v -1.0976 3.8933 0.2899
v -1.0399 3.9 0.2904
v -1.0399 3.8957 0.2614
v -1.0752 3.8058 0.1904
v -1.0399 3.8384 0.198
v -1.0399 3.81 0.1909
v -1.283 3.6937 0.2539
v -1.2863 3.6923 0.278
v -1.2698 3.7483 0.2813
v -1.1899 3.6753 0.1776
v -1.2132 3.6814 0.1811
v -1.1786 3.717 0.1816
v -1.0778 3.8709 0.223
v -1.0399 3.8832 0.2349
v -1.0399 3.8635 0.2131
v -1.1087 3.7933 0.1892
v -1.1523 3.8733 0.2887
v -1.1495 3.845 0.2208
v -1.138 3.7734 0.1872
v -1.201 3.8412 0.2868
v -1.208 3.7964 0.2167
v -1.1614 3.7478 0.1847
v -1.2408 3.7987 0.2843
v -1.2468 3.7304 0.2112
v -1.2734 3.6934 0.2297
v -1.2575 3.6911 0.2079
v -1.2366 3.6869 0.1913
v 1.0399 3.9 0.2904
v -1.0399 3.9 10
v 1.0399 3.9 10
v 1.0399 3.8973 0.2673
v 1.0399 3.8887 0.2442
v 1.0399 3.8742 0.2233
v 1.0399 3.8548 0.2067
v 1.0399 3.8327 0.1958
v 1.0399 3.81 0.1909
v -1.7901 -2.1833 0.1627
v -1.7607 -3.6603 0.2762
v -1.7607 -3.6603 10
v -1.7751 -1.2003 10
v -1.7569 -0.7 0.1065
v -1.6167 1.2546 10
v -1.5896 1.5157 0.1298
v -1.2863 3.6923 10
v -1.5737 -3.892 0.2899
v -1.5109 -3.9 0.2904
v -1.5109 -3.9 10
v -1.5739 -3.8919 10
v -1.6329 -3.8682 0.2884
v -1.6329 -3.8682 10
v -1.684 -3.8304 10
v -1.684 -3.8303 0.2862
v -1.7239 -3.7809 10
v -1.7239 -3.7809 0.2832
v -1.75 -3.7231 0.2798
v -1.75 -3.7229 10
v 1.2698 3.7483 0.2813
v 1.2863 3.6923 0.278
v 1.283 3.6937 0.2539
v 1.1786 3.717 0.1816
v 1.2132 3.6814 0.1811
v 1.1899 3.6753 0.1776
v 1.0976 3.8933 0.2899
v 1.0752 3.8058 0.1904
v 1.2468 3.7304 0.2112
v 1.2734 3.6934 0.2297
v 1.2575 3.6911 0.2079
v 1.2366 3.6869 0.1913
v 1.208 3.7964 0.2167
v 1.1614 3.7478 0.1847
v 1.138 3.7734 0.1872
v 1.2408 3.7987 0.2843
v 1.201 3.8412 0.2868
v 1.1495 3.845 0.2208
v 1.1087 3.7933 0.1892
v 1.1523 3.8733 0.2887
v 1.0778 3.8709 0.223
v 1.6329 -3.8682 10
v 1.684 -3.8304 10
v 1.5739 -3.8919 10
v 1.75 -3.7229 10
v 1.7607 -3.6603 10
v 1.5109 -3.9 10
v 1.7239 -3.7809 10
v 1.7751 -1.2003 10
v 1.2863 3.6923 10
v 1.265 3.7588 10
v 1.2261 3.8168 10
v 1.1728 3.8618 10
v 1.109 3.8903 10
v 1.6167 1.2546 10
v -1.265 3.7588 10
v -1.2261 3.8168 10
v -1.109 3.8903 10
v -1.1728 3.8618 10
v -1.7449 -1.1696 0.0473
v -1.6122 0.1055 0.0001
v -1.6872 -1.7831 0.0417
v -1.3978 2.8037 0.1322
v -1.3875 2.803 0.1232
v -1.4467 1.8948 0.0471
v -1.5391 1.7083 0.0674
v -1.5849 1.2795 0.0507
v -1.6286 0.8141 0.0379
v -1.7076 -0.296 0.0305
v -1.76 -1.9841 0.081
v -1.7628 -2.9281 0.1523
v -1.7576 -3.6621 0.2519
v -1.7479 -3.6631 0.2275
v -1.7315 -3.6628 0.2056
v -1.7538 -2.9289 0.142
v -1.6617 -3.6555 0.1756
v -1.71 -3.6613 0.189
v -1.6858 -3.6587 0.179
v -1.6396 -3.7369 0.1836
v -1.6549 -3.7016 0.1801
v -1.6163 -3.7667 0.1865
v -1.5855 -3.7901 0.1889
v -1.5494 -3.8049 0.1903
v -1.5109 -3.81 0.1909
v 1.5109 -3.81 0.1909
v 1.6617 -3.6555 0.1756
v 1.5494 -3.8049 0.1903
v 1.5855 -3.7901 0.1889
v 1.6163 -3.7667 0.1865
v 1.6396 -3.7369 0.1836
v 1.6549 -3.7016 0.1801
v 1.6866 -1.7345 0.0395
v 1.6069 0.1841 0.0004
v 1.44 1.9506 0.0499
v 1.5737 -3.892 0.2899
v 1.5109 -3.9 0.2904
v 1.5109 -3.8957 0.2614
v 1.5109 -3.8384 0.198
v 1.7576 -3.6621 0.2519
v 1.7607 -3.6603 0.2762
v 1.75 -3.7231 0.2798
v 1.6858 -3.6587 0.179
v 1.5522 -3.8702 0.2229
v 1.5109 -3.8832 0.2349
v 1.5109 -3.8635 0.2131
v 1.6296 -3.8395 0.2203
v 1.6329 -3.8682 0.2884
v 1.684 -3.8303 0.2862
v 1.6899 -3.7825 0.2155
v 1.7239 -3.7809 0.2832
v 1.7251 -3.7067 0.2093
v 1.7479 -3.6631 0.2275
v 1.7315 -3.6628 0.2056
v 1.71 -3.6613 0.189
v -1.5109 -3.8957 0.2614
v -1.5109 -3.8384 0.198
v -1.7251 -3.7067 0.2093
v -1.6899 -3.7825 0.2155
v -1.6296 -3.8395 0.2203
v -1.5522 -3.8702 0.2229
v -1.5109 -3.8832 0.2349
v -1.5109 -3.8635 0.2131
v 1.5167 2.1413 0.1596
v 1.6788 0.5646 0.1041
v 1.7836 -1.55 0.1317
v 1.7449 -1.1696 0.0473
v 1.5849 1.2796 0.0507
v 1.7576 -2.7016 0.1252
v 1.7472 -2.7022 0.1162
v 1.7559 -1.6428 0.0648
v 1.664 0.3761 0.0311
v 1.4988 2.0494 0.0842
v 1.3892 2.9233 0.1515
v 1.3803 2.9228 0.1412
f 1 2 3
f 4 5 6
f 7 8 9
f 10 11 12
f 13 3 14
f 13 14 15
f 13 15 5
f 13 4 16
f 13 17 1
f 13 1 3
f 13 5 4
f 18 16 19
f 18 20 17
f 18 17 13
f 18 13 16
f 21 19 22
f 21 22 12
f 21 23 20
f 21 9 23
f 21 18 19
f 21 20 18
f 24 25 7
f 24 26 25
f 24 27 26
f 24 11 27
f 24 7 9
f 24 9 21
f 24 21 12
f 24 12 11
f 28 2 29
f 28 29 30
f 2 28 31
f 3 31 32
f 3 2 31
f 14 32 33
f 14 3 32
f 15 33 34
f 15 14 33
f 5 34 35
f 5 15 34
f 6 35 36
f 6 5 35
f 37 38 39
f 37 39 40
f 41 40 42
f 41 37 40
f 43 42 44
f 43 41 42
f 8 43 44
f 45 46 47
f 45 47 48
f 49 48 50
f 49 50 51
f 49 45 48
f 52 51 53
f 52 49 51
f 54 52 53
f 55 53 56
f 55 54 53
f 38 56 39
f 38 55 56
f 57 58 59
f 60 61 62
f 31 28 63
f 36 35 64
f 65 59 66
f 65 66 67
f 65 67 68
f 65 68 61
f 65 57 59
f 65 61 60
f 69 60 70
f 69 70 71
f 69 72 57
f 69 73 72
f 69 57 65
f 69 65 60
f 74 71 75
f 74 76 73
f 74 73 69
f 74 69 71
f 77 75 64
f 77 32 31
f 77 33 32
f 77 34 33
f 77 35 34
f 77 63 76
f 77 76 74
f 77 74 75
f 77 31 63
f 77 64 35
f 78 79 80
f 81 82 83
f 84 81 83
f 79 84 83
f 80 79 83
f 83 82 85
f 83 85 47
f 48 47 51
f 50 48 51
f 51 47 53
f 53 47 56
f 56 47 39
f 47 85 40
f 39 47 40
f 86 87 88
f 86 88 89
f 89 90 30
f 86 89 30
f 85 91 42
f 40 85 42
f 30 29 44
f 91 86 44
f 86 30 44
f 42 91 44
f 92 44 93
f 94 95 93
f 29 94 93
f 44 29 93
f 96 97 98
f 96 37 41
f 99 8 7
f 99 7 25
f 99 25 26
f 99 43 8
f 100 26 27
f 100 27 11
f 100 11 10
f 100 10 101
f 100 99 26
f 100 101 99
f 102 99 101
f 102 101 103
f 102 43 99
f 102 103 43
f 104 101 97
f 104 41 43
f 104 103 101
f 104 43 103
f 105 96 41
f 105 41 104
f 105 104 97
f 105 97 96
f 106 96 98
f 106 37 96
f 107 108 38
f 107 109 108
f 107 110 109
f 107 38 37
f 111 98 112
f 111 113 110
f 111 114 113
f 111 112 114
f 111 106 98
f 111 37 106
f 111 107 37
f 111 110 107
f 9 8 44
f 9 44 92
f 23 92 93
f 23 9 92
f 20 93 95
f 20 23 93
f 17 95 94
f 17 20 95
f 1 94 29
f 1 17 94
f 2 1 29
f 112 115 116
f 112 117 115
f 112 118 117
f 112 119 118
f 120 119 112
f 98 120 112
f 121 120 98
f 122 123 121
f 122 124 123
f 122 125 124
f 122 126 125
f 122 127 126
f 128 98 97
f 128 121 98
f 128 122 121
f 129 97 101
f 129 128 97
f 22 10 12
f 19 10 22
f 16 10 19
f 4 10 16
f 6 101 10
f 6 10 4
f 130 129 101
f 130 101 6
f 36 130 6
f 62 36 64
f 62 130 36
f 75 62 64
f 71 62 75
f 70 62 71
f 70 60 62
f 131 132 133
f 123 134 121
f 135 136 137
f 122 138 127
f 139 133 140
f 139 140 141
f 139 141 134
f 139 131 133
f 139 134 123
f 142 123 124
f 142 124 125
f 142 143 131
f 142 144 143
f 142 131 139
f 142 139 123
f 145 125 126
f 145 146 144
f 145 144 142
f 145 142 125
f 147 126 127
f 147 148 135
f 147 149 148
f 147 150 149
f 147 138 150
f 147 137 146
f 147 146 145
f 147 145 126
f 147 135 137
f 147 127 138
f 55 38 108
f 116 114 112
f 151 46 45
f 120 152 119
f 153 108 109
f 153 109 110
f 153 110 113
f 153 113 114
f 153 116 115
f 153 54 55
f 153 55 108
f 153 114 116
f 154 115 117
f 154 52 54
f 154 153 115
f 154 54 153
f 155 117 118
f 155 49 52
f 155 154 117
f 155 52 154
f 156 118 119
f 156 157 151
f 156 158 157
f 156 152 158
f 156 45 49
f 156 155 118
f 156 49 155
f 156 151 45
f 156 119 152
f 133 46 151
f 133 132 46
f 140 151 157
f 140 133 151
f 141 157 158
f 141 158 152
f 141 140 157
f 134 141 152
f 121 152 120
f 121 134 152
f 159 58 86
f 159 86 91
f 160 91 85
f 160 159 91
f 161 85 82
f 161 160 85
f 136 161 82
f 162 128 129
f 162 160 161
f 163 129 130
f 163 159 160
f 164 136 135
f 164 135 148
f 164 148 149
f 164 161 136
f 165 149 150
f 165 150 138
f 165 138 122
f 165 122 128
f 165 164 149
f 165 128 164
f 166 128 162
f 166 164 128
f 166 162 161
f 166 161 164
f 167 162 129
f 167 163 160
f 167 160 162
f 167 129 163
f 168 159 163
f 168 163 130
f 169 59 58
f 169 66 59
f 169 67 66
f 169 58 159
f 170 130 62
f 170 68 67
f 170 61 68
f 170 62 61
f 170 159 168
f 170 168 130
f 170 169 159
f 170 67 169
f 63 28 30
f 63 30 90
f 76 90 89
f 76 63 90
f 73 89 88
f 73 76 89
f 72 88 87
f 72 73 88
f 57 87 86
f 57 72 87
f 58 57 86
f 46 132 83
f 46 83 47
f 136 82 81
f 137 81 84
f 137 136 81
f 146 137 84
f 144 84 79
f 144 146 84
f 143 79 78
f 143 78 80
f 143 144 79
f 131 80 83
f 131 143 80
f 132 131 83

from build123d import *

# Parameters (mm, degrees)
BOSS_EXTRUDE1_DEPTH = 10
CUT_EXTRUDE1_DEPTH  = 5
FILLET1_R           = 0.1


with BuildPart() as part:
    # Sketch1 → Boss-Extrude1 (new body)
    with BuildSketch(Plane.XY):
        with BuildLine():
            Line((-1.039876688, 3.9), (1.039876688, 3.9))
            ThreePointArc((1.039876688, 3.9), (1.201018652, 3.841136777), (1.286277933, 3.692266139))
            ThreePointArc((1.286277933, 3.692266139), (1.717480541, 0.028524691), (1.76066317, -3.660251846))
            ThreePointArc((1.76066317, -3.660251846), (1.683987639, -3.830364855), (1.510873459, -3.9))
            Line((1.510873459, -3.9), (-1.510873459, -3.9))
            ThreePointArc((-1.510873459, -3.9), (-1.683987639, -3.830364855), (-1.76066317, -3.660251846))
            ThreePointArc((-1.76066317, -3.660251846), (-1.717480541, 0.028524691), (-1.286277933, 3.692266139))
            ThreePointArc((-1.286277933, 3.692266139), (-1.201018652, 3.841136777), (-1.039876688, 3.9))
        make_face()
    extrude(amount=BOSS_EXTRUDE1_DEPTH)

    # Sketch2 → Cut-Extrude1 (cut, symmetric)
    with BuildSketch(Plane(origin=(0, 0, 0), x_dir=(0, 0, -1), z_dir=(1, 0, 0))):
        with BuildLine():
            Line((-0.2, 3.9), (0.726559292, 4.710927033))
            Line((0.726559292, 4.710927033), (3.434911983, -0.70577835))
            Line((3.434911983, -0.70577835), (0.497037877, -4.82568774))
            Line((0.497037877, -4.82568774), (-0.2, -3.9))
            ThreePointArc((-0.2, -3.9), (0, 0), (-0.2, 3.9))
        make_face()
    extrude(amount=CUT_EXTRUDE1_DEPTH, both=True, mode=Mode.SUBTRACT)

    # Fillet1
    fillet1_edges = [part.edges().sort_by_distance(p)[0] for p in [
        (0, -3.9, 0.2),
        (1.684192827, -3.830167686, 0.192883786),
        (1.717477583, 0.028570224, 1.0712e-05),
        (-1.717477583, 0.028570224, 1.0712e-05),
        (-1.684192827, -3.830167687, 0.192883786),
        (-1.201207437, 3.840977456, 0.19397685),
        (1.201207437, 3.840977456, 0.19397685),
        (0, 3.9, 0.2),
    ]]
    fillet(fillet1_edges, radius=FILLET1_R)


solid = part.part
